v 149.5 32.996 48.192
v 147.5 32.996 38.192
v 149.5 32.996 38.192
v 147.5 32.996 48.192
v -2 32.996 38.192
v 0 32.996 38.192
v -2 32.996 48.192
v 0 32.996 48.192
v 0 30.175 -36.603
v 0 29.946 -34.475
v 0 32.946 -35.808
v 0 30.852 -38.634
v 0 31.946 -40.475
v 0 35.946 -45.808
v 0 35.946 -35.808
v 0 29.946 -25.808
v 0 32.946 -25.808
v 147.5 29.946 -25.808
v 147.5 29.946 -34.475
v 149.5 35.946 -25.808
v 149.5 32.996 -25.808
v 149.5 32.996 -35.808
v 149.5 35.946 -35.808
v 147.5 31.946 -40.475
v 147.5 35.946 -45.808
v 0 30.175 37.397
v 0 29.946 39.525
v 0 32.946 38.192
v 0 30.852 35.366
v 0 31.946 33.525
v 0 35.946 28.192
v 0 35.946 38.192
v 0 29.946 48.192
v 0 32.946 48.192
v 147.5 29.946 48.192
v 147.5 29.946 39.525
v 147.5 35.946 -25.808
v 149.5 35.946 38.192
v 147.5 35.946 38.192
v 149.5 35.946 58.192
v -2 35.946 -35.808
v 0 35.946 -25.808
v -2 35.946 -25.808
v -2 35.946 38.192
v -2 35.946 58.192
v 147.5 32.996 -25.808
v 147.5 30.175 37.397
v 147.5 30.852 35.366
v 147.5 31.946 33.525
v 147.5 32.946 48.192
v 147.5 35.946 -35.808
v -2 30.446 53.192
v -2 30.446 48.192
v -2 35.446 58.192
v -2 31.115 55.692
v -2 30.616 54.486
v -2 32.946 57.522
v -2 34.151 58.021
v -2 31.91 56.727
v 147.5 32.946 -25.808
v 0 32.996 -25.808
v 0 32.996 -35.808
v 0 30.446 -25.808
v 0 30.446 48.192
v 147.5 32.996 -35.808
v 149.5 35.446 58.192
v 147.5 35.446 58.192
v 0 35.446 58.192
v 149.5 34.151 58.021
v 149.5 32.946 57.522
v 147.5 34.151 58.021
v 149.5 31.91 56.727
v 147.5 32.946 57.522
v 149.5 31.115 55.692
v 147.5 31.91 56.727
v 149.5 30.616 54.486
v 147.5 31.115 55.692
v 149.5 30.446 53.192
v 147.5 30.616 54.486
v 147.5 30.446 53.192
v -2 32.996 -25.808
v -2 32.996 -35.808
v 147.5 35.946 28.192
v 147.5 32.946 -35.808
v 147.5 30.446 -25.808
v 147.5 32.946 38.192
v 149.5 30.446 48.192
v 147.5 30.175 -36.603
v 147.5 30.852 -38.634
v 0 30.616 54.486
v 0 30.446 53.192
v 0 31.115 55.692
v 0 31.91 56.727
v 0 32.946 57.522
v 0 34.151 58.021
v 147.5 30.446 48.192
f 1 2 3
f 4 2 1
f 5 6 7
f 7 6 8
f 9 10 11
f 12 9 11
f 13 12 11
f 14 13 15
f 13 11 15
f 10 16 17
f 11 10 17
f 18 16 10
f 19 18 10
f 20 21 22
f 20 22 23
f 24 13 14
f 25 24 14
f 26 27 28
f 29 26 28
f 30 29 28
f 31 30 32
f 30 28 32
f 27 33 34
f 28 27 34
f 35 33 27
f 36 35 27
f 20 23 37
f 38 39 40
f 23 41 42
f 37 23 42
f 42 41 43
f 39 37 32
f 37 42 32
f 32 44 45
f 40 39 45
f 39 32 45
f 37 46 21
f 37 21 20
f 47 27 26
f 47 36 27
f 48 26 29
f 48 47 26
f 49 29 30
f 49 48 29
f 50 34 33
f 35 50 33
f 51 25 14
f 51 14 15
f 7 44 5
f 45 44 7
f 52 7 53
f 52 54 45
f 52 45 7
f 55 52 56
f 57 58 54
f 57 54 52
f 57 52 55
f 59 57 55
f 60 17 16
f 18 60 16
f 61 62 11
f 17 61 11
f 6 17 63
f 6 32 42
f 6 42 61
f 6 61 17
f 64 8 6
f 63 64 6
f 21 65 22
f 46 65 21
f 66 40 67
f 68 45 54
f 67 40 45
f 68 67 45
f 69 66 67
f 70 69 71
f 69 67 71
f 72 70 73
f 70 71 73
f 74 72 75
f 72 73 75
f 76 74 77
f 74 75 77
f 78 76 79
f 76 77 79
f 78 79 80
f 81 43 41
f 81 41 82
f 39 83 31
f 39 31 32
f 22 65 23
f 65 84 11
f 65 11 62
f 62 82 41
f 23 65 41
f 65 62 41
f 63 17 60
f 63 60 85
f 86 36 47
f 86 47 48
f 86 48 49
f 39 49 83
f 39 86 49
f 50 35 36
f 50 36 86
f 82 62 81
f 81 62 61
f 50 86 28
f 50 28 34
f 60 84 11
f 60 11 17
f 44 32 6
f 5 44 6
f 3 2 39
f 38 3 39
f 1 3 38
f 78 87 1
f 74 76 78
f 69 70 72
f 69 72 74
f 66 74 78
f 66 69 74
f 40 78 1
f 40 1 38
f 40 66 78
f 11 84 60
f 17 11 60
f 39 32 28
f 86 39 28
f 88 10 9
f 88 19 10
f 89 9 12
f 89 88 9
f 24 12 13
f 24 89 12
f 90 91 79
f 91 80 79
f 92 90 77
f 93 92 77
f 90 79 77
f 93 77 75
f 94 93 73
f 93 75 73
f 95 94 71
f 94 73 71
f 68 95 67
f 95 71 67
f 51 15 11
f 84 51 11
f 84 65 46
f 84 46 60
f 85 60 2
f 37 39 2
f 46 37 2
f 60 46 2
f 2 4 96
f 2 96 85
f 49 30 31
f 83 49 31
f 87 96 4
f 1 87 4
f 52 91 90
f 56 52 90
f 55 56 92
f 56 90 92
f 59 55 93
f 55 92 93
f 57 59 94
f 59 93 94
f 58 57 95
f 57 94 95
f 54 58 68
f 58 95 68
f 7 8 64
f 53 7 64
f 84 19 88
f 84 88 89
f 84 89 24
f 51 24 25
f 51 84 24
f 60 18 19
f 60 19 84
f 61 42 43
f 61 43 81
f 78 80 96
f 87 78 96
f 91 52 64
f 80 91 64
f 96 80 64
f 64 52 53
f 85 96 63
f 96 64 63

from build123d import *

# Parameters (mm, degrees)
F1_DEPTH  = 147.5
F2_R      = 10
F2_2_R    = 10
F4_DEPTH  = 147.5
F5_W      = 2.95
F5_H      = 10
F6_DEPTH  = 2
F7_W      = 2.95
F7_H      = 10
F8_DEPTH  = 2
F9_R      = 5
F11_DEPTH = 2
F13_DEPTH = 2


with BuildPart() as f1:
    # F0 (on Right) → F1 (new body)
    with BuildSketch(Plane.YZ):
        Polygon((35.9455486238, 28.1918546259), (35.9455486238, 38.1918546259), (32.9455486238, 38.1918546259), (32.9455486238, 48.1918546259), (29.9455486238, 48.1918546259), (29.9455486238, 36.1918546259), align=None)
    extrude(amount=F1_DEPTH)

    # F2
    f2_edges = [f1.edges().sort_by_distance(p)[0] for p in [
        (73.75, 29.945549, 36.191855),
    ]]
    fillet(f2_edges, radius=F2_R)


with BuildPart() as f1b:
    # F0 (on Right) → F1, piece 2 (new body)
    with BuildSketch(Plane.YZ):
        Polygon((35.9455486238, -45.8081453741), (35.9455486238, -35.8081453741), (32.9455486238, -35.8081453741), (32.9455486238, -25.8081453741), (29.9455486238, -25.8081453741), (29.9455486238, -37.8081453741), align=None)
    extrude(amount=F1_DEPTH)

    # F2#2
    f2_2_edges = [f1b.edges().sort_by_distance(p)[0] for p in [
        (73.75, 29.945549, -37.808145),
    ]]
    fillet(f2_2_edges, radius=F2_2_R)


with BuildPart() as f4:
    # F3 (on face) → F4 (new body)
    with BuildSketch(Plane(origin=(0, 0, 0), x_dir=(0, -1, 0), z_dir=(-1, 0, 0))):
        Polygon((-30.4455486238, 58.1918546259), (-35.9455486238, 58.1918546259), (-35.9455486238, -35.8081453741), (-32.9455486238, -35.8081453741), (-32.9455486238, -25.8081453741), (-30.4455486238, -25.8081453741), align=None)
    extrude(amount=-F4_DEPTH)

    # F5 (on face) → F6 (join)
    with BuildSketch(Plane(origin=(0, 0, 0), x_dir=(0, -1, 0), z_dir=(-1, 0, 0))):
        with Locations((-34.4705486238, 43.1918546259)):
            Rectangle(F5_W, F5_H)
        with Locations((-34.4705486238, -30.8081453741)):
            Rectangle(F5_W, F5_H)
    extrude(amount=F6_DEPTH)

    # F7 (on face) → F8 (join)
    with BuildSketch(Plane.YZ.offset(147.5)):
        with Locations((34.4705486238, 43.1918546259)):
            Rectangle(F7_W, F7_H)
        with Locations((34.4705486238, -30.8081453741)):
            Rectangle(F7_W, F7_H)
    extrude(amount=F8_DEPTH)

    # F9
    f9_edges = [f4.edges().sort_by_distance(p)[0] for p in [
        (73.75, 30.445549, 58.191855),
    ]]
    fillet(f9_edges, radius=F9_R)

    # F10 (on face) → F11 (join)
    with BuildSketch(Plane(origin=(0, 0, 0), x_dir=(0, -1, 0), z_dir=(-1, 0, 0))):
        with BuildLine():
            Line((-35.9455486238, 48.1918546259), (-32.9955486238, 48.1918546259))
            Line((-32.9955486238, 48.1918546259), (-30.4455486238, 48.1918546259))
            Line((-30.4455486238, 48.1918546259), (-30.4455486238, 53.1918546259))
            ThreePointArc((-30.4455486238, 53.1918546259), (-31.9100147179, 56.7273885319), (-35.4455486238, 58.1918546259))
            Line((-35.4455486238, 58.1918546259), (-35.9455486238, 58.1918546259))
            Line((-35.9455486238, 58.1918546259), (-35.9455486238, 48.1918546259))
        make_face()
    extrude(amount=F11_DEPTH)

    # F12 (on face) → F13 (join)
    with BuildSketch(Plane.YZ.offset(147.5)):
        with BuildLine():
            Line((30.4455486238, 48.1918546259), (32.9955486238, 48.1918546259))
            Line((32.9955486238, 48.1918546259), (35.9455486238, 48.1918546259))
            Line((35.9455486238, 48.1918546259), (35.9455486238, 58.1918546259))
            Line((35.9455486238, 58.1918546259), (35.4455486238, 58.1918546259))
            ThreePointArc((35.4455486238, 58.1918546259), (31.9100147179, 56.7273885319), (30.4455486238, 53.1918546259))
            Line((30.4455486238, 53.1918546259), (30.4455486238, 48.1918546259))
        make_face()
    extrude(amount=F13_DEPTH)


solid = Compound([f1.part, f1b.part, f4.part])
